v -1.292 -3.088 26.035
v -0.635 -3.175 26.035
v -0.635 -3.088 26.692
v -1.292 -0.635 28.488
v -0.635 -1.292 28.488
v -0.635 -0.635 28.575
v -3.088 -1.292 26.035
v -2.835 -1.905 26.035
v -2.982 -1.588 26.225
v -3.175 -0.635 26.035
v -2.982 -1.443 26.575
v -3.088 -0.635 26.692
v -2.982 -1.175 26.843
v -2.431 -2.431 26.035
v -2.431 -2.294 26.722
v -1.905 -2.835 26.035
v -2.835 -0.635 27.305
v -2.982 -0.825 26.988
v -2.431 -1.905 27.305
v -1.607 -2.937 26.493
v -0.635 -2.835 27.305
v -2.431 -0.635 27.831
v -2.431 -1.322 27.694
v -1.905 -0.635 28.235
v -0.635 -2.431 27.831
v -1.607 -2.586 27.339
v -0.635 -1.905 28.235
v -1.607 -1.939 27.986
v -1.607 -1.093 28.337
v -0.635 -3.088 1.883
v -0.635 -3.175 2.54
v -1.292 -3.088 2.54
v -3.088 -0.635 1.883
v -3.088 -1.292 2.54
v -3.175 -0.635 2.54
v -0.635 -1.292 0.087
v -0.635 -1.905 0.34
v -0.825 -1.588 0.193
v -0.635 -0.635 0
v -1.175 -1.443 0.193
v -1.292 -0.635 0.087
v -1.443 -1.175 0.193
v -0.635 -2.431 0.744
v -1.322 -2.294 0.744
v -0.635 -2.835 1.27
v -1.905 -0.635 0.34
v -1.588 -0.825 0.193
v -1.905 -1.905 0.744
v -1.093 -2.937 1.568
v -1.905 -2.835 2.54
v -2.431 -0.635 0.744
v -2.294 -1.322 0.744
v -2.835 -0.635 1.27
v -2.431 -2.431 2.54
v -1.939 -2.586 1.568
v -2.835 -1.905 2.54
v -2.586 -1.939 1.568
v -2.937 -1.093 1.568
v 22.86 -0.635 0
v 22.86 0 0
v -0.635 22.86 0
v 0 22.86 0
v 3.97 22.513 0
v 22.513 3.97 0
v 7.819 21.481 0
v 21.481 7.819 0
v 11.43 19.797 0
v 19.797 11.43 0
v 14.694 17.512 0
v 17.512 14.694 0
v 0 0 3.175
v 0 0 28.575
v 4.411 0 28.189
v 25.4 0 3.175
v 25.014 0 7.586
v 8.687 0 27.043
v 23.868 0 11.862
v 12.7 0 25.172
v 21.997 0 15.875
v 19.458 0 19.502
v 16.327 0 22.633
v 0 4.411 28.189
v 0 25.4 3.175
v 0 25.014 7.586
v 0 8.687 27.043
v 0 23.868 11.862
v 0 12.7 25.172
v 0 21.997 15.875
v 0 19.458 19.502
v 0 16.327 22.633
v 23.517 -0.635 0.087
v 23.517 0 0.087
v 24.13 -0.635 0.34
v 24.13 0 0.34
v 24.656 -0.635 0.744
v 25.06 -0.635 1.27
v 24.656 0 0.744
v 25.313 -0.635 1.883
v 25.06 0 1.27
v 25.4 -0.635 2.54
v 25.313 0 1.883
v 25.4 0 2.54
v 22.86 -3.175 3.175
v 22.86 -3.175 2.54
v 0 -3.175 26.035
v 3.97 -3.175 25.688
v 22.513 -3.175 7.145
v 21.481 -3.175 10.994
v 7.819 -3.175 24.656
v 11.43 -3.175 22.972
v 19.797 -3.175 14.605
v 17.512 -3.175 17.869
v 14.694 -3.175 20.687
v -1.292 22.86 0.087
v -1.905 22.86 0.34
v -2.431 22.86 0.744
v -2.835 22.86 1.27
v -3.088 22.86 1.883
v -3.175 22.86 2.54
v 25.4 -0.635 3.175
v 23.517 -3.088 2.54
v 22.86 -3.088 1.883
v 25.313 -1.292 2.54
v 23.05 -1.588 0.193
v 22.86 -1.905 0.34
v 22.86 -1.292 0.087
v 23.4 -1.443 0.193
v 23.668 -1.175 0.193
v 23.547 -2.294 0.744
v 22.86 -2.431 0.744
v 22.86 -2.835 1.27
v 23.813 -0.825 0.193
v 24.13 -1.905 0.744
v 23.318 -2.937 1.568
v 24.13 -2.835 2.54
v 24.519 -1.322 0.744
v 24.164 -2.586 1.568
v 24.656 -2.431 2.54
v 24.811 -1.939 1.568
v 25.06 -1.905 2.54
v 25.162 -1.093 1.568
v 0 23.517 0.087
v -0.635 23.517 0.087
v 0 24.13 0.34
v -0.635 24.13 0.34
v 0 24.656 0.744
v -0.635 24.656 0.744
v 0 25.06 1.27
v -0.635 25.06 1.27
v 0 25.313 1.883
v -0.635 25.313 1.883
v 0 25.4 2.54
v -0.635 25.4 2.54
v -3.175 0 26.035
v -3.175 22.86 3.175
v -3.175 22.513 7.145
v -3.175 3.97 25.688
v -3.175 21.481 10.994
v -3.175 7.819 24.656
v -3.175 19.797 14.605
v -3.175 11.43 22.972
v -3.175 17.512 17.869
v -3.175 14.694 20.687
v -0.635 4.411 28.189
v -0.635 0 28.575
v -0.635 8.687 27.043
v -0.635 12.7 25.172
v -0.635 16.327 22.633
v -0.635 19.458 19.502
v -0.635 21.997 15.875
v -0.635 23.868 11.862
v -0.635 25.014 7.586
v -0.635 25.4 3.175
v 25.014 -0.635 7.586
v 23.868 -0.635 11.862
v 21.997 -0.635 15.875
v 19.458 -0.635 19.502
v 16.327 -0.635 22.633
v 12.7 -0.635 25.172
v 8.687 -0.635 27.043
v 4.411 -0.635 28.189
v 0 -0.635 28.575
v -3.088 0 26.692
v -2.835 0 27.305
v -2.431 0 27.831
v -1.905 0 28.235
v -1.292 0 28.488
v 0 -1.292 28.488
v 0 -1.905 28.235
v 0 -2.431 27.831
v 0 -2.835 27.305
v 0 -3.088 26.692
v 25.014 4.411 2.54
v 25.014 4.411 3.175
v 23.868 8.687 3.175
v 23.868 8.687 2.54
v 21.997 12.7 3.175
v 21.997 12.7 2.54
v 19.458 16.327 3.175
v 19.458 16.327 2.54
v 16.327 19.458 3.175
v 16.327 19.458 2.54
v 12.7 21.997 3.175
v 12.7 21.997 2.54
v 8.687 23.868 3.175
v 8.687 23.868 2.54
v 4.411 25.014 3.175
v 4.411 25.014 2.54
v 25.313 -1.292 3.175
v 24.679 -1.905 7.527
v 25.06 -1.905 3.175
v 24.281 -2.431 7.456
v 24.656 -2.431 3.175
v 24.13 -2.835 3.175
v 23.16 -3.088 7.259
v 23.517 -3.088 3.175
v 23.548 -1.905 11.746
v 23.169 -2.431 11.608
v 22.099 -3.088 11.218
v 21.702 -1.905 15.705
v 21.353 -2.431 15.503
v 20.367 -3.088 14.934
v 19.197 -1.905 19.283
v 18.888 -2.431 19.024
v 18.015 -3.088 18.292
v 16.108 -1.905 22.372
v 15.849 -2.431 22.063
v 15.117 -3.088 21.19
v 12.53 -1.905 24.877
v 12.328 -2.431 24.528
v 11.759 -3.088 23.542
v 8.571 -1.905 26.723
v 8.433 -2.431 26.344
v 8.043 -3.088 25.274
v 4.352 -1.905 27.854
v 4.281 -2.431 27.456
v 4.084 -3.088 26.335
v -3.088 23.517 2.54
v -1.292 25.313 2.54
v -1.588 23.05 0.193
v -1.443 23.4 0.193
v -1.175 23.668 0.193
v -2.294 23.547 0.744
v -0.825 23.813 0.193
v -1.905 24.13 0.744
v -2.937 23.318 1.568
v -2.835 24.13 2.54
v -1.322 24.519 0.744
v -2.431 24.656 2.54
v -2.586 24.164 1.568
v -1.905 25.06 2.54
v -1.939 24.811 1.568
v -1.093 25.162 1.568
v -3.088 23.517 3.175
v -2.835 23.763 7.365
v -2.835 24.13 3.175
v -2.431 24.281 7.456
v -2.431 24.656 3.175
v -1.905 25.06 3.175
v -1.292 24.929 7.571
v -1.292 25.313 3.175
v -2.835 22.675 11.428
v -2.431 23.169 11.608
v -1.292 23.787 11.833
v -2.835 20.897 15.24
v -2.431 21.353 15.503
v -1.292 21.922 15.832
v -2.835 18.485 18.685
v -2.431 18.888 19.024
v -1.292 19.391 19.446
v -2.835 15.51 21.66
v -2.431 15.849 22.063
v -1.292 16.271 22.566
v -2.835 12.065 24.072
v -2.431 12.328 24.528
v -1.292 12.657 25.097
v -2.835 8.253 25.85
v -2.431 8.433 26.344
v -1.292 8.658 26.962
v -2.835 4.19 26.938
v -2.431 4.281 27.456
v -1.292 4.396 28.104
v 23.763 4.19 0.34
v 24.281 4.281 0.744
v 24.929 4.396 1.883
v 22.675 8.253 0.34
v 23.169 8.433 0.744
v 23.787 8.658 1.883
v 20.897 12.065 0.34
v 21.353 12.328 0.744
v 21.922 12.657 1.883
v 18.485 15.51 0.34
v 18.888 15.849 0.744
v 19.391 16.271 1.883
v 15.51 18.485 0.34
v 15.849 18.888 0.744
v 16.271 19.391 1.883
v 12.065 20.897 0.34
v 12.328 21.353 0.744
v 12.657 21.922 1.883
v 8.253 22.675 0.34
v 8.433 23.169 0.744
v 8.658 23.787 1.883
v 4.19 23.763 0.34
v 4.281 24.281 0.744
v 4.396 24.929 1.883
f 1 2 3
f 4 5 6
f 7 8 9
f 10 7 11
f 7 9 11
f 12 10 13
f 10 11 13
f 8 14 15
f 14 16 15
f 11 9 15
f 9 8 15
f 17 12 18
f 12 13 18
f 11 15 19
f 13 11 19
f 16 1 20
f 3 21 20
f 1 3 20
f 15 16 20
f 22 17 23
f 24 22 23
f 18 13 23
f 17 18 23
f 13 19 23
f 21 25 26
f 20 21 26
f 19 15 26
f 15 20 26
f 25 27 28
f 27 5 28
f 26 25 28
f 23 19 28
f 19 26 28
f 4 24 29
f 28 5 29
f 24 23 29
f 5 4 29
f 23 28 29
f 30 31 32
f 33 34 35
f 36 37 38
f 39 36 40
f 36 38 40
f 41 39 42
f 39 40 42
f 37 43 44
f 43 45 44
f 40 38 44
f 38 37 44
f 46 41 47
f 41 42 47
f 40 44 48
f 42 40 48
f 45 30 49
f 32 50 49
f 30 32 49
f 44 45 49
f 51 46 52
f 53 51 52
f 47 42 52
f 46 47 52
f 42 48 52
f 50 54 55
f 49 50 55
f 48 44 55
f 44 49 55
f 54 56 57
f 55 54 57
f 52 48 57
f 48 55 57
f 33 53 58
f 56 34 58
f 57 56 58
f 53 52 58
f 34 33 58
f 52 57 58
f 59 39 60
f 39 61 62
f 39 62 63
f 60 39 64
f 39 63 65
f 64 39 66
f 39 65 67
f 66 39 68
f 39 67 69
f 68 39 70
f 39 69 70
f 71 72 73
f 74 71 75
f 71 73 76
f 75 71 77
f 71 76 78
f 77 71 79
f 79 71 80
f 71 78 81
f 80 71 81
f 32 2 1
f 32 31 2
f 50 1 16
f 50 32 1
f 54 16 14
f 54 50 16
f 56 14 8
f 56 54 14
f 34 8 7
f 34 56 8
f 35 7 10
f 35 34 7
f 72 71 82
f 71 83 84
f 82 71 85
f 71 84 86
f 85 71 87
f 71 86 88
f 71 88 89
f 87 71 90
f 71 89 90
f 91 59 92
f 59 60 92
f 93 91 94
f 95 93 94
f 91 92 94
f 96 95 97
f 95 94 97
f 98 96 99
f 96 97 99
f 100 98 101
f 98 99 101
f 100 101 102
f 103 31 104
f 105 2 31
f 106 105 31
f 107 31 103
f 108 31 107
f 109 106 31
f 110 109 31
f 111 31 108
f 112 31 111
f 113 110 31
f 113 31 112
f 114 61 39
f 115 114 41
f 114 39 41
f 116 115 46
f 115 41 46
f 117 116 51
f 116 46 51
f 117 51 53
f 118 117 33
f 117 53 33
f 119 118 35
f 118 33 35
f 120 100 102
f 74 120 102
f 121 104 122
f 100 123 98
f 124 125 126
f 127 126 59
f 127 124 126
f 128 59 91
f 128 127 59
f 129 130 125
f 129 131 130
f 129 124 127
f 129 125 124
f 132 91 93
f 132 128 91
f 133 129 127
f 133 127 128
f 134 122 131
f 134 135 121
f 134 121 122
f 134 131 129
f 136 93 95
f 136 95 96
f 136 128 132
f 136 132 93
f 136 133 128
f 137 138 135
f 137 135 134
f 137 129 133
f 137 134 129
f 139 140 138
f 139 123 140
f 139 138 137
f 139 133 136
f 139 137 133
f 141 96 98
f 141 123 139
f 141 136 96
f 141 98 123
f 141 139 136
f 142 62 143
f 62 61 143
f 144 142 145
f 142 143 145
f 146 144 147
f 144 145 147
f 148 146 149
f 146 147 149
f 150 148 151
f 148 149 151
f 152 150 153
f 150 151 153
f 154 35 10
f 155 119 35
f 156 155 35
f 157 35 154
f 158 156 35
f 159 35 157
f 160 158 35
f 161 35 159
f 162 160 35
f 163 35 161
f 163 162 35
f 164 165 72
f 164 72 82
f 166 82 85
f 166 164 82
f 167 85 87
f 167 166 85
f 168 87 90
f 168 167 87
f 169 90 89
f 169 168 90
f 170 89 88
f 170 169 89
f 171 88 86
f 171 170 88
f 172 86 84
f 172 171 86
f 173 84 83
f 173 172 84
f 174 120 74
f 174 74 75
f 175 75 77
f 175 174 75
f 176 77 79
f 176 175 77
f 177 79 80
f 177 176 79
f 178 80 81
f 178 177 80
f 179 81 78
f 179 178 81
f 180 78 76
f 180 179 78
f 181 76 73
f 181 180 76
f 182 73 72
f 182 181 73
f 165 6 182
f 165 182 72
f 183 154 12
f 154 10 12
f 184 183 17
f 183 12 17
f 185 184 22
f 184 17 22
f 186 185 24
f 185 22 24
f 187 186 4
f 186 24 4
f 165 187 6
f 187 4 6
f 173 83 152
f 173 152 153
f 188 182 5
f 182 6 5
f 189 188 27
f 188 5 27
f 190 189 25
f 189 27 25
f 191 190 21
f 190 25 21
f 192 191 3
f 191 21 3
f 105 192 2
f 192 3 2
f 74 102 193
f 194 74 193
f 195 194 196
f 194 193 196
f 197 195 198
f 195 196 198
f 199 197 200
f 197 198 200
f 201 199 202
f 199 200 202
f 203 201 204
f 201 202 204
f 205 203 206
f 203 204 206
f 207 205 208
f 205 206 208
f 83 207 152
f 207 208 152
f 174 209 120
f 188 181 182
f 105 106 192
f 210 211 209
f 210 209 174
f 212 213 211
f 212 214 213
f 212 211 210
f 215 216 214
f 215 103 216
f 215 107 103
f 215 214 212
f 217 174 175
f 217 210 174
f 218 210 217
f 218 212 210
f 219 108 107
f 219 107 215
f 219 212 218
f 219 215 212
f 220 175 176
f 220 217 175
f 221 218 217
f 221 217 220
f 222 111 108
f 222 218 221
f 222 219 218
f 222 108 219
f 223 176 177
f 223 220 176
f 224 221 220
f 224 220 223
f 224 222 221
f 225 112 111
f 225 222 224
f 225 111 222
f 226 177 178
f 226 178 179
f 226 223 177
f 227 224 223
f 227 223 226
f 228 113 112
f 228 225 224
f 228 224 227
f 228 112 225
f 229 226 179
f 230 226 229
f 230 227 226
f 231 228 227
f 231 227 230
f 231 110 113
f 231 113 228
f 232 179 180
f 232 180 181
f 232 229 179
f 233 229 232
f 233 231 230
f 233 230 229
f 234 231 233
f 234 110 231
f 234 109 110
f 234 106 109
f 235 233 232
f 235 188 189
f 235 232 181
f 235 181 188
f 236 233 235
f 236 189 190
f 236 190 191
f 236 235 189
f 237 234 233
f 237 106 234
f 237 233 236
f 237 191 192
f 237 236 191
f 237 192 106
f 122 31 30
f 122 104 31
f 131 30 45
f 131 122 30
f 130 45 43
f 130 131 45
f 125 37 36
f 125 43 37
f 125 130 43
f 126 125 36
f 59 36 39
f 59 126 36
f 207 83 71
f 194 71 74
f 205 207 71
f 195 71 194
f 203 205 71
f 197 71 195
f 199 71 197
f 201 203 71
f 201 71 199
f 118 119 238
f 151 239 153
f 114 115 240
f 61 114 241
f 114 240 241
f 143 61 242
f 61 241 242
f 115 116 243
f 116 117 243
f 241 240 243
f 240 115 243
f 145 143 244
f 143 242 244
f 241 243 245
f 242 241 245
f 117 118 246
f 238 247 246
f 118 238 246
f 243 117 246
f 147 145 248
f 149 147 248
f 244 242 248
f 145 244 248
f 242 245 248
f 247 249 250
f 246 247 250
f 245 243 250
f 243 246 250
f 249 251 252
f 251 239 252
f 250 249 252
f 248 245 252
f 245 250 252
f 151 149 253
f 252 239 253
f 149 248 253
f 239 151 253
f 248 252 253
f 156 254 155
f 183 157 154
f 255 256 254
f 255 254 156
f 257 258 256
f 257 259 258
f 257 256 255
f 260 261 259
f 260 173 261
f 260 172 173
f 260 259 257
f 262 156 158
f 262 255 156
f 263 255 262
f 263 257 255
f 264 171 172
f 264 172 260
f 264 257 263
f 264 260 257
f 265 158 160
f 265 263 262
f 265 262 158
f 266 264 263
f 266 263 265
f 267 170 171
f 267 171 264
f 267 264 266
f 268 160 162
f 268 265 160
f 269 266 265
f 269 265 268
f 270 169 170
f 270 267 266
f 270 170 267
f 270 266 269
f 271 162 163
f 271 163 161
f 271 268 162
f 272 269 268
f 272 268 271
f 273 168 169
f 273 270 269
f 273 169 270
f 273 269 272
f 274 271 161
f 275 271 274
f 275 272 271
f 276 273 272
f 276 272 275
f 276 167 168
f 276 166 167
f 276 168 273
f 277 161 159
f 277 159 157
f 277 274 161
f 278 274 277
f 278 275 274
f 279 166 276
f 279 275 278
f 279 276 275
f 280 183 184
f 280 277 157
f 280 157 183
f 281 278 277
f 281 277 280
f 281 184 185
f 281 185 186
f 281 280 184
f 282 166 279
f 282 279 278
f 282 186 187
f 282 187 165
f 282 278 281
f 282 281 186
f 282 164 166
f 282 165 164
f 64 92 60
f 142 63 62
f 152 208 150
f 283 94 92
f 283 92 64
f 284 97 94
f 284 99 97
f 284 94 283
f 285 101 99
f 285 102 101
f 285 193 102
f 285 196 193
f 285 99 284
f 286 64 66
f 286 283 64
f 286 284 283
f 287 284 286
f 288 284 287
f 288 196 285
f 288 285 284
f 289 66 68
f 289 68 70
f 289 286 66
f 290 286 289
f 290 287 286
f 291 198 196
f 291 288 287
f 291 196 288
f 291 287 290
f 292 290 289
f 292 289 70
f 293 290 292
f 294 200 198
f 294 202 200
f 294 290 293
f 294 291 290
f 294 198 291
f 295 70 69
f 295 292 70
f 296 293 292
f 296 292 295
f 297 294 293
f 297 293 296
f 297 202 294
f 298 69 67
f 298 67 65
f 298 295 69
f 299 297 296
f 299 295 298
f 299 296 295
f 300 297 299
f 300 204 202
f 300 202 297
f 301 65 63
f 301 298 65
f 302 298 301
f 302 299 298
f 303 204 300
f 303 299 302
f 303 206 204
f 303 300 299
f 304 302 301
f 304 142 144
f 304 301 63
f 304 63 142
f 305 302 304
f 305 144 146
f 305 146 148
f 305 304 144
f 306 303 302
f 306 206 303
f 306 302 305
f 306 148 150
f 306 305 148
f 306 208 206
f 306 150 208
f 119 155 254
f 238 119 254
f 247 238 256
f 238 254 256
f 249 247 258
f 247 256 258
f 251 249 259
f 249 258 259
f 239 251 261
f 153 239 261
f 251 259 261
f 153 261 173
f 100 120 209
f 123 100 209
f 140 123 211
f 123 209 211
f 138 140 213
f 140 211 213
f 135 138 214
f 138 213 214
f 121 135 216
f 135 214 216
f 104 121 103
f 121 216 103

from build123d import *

# Parameters (mm, degrees)
BOSS_EXTRUDE1_DEPTH = 3.175
SKETCH2_W           = 25.4
SKETCH2_H           = 3.175
BOSS_EXTRUDE2_DEPTH = 3.175
BOSS_EXTRUDE3_DEPTH = 3.175
FILLET1_R           = 2.54


with BuildPart() as part:
    # Sketch1 → Boss-Extrude1 (new body)
    with BuildSketch(Plane.XY):
        Polygon((-3.175, -3.175), (25.4, -3.175), (25.4, 0), (0, 0), (0, 25.4), (-3.175, 25.4), align=None)
        with BuildLine():
            Line((0, 0), (25.4, 0))
            ThreePointArc((25.4, 0), (17.960512242, 17.960512242), (0, 25.4))
            Line((0, 25.4), (0, 0))
        make_face()
    extrude(amount=BOSS_EXTRUDE1_DEPTH)

    # Sketch2 → Boss-Extrude2 (add)
    with BuildSketch(Plane.ZY.offset(3.175)):
        with Locations((15.875, -1.5875)):
            Rectangle(SKETCH2_W, SKETCH2_H)
        with BuildLine():
            ThreePointArc((28.575, 0), (21.135512242, 17.960512242), (3.175, 25.4))
            Line((3.175, 25.4), (3.175, 0))
            Line((3.175, 0), (28.575, 0))
        make_face()
    extrude(amount=-BOSS_EXTRUDE2_DEPTH)

    # Sketch5 → Boss-Extrude3 (add)
    with BuildSketch(Plane.XZ.offset(3.175)):
        with BuildLine():
            Line((0, 28.575), (0, 3.175))
            Line((0, 3.175), (25.4, 3.175))
            ThreePointArc((25.4, 3.175), (17.960512242, 21.135512242), (0, 28.575))
        make_face()
    extrude(amount=-BOSS_EXTRUDE3_DEPTH)

    # Fillet1
    fillet1_edges = [part.edges().sort_by_distance(p)[0] for p in [
        (25.4, -3.175, 1.5875),
        (-3.175, -3.175, 14.2875),
        (-3.175, 25.4, 1.5875),
        (-1.5875, -3.175, 28.575),
        (-3.175, -1.5875, 28.575),
        (-3.175, 17.960512242, 21.135512242),
        (17.960512242, -3.175, 21.135512242),
        (11.1125, -3.175, 0),
        (-3.175, 11.1125, 0),
        (-1.5875, 25.4, 0),
        (17.960512242, 17.960512242, 0),
        (25.4, -1.5875, 0),
    ]]
    fillet(fillet1_edges, radius=FILLET1_R)


solid = part.part
